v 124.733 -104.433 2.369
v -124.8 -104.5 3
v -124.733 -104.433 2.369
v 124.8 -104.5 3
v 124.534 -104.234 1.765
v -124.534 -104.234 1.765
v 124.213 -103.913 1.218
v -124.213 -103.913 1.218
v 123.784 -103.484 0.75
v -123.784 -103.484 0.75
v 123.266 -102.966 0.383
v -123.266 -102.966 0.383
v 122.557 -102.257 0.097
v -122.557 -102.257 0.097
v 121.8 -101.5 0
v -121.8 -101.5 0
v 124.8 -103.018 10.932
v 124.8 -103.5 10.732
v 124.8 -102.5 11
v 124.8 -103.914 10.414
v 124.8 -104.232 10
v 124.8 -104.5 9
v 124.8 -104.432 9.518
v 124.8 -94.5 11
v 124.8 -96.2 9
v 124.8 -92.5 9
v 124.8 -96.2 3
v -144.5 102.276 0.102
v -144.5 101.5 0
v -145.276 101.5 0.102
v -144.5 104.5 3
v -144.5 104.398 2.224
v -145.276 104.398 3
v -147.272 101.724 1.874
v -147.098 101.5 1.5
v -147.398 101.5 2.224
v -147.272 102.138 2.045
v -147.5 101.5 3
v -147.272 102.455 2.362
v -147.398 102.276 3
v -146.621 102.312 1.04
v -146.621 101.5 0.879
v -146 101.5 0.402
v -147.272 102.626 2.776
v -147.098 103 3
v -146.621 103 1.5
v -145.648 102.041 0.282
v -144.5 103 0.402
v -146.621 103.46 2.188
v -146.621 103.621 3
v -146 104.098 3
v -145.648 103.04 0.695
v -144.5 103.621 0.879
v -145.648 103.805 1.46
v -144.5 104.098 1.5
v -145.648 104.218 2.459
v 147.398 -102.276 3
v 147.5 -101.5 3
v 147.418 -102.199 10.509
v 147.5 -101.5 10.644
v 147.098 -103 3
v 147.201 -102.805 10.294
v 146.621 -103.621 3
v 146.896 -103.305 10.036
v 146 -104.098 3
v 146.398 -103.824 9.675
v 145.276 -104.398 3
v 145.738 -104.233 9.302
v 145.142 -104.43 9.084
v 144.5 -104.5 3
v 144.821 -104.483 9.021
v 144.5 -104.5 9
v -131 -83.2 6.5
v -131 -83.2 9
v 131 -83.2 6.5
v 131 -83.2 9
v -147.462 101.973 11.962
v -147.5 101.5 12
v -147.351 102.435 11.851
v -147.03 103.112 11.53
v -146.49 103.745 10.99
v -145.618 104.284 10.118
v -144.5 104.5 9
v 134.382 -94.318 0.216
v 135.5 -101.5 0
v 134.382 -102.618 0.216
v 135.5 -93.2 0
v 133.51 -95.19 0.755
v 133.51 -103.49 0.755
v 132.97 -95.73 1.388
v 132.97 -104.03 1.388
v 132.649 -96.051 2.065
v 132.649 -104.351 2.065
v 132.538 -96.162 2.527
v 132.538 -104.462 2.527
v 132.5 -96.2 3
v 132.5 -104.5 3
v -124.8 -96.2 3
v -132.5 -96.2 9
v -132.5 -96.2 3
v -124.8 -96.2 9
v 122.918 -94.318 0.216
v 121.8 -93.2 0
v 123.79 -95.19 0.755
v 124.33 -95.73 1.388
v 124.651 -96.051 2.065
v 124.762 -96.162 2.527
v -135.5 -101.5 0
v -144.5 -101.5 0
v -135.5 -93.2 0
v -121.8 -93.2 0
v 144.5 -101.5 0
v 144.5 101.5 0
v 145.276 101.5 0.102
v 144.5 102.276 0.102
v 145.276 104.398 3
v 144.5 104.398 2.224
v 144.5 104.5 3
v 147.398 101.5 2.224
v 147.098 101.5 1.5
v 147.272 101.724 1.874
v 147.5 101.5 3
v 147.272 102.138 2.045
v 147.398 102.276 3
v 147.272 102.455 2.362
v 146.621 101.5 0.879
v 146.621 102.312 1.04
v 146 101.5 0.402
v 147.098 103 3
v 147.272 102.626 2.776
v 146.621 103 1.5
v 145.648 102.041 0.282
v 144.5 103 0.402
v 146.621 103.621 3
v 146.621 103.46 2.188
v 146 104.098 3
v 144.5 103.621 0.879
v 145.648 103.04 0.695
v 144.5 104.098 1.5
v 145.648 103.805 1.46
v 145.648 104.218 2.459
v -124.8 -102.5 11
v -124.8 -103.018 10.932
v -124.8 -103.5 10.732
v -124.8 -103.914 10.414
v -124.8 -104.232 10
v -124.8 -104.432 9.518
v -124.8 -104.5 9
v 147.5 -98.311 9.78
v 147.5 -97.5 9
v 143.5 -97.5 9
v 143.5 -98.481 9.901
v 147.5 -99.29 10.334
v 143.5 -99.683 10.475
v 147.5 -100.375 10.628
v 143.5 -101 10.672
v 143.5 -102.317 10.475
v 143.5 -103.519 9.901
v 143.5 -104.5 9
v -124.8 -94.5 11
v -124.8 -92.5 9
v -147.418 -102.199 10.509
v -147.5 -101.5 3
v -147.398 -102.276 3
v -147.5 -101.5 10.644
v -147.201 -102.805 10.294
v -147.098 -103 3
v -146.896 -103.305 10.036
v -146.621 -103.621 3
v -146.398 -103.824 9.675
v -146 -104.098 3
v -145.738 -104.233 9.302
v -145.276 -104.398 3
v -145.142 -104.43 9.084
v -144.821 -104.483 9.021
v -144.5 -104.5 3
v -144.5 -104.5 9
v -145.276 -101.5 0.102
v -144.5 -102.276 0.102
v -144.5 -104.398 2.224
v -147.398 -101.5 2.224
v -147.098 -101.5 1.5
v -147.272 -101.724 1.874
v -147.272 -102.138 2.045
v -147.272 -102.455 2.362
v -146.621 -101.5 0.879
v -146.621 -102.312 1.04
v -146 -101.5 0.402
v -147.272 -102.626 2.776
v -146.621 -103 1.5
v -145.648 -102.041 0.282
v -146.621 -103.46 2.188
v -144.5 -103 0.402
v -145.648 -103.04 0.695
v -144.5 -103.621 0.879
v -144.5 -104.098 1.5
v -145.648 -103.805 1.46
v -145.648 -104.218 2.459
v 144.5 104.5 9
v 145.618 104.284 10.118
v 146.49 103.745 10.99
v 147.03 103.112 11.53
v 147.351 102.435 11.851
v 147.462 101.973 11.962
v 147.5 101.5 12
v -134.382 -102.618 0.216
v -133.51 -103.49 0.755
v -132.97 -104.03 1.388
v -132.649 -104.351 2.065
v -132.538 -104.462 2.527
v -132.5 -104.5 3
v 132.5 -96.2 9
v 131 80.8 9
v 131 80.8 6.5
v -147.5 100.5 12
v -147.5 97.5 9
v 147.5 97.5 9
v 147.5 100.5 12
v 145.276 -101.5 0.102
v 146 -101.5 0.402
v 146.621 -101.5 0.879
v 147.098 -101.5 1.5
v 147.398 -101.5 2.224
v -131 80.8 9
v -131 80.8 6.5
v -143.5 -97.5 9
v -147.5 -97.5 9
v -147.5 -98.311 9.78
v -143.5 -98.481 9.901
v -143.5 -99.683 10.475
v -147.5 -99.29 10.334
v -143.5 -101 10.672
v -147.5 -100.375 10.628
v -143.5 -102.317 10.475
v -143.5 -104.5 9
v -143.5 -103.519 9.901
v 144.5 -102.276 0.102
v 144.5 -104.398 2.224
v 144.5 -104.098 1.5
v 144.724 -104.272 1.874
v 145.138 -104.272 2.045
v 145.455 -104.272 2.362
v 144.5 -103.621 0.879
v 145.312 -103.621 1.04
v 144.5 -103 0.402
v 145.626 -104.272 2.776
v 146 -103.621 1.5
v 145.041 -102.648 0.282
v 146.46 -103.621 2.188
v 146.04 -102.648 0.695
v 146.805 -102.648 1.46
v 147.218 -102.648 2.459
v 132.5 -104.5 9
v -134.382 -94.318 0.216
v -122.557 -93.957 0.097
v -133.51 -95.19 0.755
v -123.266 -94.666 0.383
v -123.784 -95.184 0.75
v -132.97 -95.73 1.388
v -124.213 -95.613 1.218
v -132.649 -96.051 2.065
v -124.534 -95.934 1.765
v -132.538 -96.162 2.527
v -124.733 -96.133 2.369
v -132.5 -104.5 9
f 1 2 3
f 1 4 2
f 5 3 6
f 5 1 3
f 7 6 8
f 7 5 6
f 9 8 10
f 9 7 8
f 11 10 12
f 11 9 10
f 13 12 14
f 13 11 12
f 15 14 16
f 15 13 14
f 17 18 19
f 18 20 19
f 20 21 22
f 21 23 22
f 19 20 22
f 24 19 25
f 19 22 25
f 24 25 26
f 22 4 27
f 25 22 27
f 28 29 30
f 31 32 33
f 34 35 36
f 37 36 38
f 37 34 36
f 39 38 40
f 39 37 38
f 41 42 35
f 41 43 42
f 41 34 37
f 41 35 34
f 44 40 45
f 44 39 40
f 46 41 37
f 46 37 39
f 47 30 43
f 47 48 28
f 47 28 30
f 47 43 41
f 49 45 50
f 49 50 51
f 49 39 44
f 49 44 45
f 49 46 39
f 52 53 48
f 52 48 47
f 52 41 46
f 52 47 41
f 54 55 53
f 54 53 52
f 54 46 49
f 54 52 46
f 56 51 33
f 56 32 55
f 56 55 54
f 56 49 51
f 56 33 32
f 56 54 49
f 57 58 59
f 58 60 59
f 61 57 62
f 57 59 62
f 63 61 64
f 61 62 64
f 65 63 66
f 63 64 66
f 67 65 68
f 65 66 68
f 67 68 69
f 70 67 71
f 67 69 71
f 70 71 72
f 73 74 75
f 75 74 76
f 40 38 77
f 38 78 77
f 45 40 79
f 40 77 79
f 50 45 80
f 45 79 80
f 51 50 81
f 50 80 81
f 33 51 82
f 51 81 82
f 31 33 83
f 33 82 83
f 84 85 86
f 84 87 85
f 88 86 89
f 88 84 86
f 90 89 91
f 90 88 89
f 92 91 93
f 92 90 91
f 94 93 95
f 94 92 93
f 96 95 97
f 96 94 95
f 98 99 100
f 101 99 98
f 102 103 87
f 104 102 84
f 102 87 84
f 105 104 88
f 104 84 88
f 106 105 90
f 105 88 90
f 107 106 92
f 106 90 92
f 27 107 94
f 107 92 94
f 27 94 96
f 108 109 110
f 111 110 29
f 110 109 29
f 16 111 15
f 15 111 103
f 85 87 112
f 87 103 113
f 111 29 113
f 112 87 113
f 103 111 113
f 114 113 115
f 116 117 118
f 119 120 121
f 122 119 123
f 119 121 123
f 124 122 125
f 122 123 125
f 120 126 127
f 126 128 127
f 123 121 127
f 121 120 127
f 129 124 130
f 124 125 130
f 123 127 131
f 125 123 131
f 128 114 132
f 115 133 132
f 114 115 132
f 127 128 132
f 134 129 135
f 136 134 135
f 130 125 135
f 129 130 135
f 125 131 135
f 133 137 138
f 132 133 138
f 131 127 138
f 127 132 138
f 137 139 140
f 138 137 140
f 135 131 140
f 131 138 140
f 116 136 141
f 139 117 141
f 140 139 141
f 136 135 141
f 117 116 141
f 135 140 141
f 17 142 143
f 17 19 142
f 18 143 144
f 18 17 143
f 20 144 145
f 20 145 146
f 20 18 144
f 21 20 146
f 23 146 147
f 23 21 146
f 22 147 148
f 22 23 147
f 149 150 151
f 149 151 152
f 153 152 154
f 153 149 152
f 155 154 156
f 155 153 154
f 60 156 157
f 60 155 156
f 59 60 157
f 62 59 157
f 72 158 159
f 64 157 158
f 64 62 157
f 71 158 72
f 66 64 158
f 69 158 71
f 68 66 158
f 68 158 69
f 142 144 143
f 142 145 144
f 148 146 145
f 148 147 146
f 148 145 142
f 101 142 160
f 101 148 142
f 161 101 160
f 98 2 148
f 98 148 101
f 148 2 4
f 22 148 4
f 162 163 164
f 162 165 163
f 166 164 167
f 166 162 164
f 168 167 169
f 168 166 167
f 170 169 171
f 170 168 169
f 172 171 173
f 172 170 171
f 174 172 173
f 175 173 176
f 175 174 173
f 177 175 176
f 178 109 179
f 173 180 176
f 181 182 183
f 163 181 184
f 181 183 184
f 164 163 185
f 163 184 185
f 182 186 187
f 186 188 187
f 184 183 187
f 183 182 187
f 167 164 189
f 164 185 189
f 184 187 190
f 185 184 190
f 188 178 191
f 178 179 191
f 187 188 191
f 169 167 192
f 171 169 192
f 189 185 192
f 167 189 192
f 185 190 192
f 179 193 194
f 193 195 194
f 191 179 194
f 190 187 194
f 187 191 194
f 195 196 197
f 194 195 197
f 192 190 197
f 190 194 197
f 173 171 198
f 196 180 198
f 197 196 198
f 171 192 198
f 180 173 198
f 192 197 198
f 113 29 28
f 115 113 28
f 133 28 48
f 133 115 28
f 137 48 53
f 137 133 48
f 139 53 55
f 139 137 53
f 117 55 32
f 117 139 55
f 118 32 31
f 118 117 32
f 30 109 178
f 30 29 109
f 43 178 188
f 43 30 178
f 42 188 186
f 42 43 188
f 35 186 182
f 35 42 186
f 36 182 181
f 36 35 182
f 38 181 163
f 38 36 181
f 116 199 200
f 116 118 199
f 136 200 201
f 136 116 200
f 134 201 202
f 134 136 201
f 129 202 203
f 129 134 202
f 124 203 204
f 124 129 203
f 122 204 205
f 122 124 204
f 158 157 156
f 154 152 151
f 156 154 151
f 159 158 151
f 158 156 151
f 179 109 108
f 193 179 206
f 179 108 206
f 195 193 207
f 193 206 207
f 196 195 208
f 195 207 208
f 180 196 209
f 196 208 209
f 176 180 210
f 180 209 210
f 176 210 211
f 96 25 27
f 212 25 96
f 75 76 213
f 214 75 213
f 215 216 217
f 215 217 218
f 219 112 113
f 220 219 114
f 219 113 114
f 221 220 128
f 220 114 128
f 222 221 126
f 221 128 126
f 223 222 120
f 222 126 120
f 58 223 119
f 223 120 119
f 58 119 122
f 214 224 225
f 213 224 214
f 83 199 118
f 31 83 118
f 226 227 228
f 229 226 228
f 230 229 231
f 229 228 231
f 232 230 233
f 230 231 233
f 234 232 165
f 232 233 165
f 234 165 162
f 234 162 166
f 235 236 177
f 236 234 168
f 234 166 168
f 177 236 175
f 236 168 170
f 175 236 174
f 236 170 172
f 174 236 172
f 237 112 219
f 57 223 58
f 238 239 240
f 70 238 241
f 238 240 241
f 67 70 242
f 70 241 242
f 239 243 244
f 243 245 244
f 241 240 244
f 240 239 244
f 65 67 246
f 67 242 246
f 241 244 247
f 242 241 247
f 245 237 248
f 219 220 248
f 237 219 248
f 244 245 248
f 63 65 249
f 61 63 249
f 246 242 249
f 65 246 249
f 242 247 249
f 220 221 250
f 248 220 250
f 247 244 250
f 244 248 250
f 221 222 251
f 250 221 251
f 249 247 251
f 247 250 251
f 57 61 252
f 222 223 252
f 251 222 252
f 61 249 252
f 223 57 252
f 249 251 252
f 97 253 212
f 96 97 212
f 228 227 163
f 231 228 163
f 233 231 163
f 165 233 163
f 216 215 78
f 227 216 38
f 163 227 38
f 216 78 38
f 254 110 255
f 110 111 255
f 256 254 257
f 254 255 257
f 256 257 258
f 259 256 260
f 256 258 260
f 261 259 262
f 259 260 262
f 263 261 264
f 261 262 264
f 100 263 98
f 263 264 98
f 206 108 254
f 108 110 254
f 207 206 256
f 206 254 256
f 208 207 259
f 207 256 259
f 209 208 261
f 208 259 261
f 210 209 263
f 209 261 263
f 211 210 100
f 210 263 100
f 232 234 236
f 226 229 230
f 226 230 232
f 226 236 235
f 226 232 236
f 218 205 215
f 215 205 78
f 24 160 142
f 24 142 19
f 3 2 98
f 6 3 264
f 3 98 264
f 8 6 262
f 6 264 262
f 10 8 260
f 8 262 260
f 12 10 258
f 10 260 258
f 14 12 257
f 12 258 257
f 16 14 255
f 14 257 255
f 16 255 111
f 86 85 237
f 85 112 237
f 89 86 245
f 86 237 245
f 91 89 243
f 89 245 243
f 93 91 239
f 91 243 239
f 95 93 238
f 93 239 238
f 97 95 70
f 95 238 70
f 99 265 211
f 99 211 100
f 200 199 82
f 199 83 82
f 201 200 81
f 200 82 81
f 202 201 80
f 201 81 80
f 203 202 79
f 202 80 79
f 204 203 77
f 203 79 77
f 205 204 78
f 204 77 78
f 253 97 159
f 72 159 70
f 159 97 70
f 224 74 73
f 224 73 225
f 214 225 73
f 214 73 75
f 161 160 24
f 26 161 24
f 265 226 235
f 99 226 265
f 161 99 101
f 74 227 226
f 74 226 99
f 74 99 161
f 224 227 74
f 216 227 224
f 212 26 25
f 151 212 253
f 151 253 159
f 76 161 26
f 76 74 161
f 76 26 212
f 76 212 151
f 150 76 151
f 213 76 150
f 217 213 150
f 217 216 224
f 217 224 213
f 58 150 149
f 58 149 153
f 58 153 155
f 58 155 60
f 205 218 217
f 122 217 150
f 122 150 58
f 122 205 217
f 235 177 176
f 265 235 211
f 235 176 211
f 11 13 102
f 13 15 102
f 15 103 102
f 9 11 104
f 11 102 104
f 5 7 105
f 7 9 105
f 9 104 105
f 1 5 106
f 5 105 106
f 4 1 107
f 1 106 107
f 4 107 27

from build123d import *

# Parameters (mm, degrees)
SKETCH1_W           = 295
SKETCH1_H           = 209
BOSS_EXTRUDE1_DEPTH = 9
SKETCH2_W           = 262
SKETCH2_H           = 164
CUT_EXTRUDE1_DEPTH  = 2.5
SKETCH3_W           = 3
SKETCH3_H           = 3
BOSS_EXTRUDE2_DEPTH = 295
CHAMFER1_SIZE       = 4
SKETCH4_W           = 7.7
SKETCH4_H           = 8.3
CUT_EXTRUDE2_DEPTH  = 250
BOSS_EXTRUDE3_DEPTH = 4
SKETCH6_W           = 249.6
SKETCH6_H           = 10
BOSS_EXTRUDE4_DEPTH = 2
CHAMFER2_SIZE       = 2
FILLET1_R           = 2
FILLET2_R           = 3


# Some blends are built 0.0001 mm under size
with BuildPart() as part:
    # Sketch1 → Boss-Extrude1 (new body)
    with BuildSketch(Plane.XY):
        Rectangle(SKETCH1_W, SKETCH1_H)
    extrude(amount=BOSS_EXTRUDE1_DEPTH)

    # Sketch2 → Cut-Extrude1 (cut)
    with BuildSketch(Plane.XY.offset(9)):
        with Locations((0, -1.2)):
            Rectangle(SKETCH2_W, SKETCH2_H)
    extrude(amount=-CUT_EXTRUDE1_DEPTH, mode=Mode.SUBTRACT)

    # Sketch3 → Boss-Extrude2 (add)
    with BuildSketch(Plane(origin=(147.5, 0, 0), x_dir=(0, 0, -1), z_dir=(1, 0, 0))):
        with Locations((-10.5, 103)):
            Rectangle(SKETCH3_W, SKETCH3_H)
    extrude(amount=-BOSS_EXTRUDE2_DEPTH)

    # Chamfer1
    # the kernel refuses this chamfer: 4 mm, written as the material it adds along each edge
    with BuildSketch(Plane(origin=(147.5, 101.5, 9), x_dir=(0, -0.9996219169112968, -0.02749587661058651), z_dir=(-1, 0, 0))) as chamfer1_piece_1_section:
        Polygon((CHAMFER1_SIZE * 0.999621916911, CHAMFER1_SIZE * 0.0274958766106), (-CHAMFER1_SIZE * 0.0274958766106, CHAMFER1_SIZE * 0.999621916911), (0, 0), align=None)
    chamfer1_piece_1 = extrude(amount=295, mode=Mode.PRIVATE)
    chamfer1_piece_1 = split(chamfer1_piece_1, bisect_by=Plane(origin=(0, 100.092163559, 12), z_dir=(0, 0, -1)), keep=Keep.TOP, mode=Mode.PRIVATE)
    add(chamfer1_piece_1)

    # Sketch4 → Cut-Extrude2 (cut)
    with BuildSketch(Plane.XY.offset(9)):
        with Locations((-128.65, -100.35)):
            Rectangle(SKETCH4_W, SKETCH4_H)
        with Locations((128.65, -100.35)):
            Rectangle(SKETCH4_W, SKETCH4_H)
    extrude(amount=-CUT_EXTRUDE2_DEPTH, mode=Mode.SUBTRACT)

    # Sketch5 → Boss-Extrude3 (add)
    with BuildSketch(Plane(origin=(147.5, 0, 0), x_dir=(0, 0, -1), z_dir=(1, 0, 0))):
        with BuildLine():
            Line((-9, -104.5), (-9, -97.5))
            ThreePointArc((-9, -97.5), (-10.671572875, -101), (-9, -104.5))
        make_face()
    boss_extrude3 = extrude(amount=-BOSS_EXTRUDE3_DEPTH)

    # Mirror1: Boss-Extrude3 across plane
    add(boss_extrude3.mirror(Plane(origin=(0, 0, 0), x_dir=(0, 0, 1), z_dir=(1, 0, 0))))

    # Sketch6 → Boss-Extrude4 (add)
    with BuildSketch(Plane.XY.offset(9)):
        with Locations((0, -99.5)):
            Rectangle(SKETCH6_W, SKETCH6_H)
    extrude(amount=BOSS_EXTRUDE4_DEPTH)

    # Chamfer2
    chamfer2_edges = [part.edges().sort_by_distance(p)[0] for p in [
        (0, -94.5, 9),
    ]]
    chamfer(chamfer2_edges, length=CHAMFER2_SIZE - 0.0001)  # a hair under: the kernel refuses the full size

    # Fillet1
    fillet1_edges = [part.edges().sort_by_distance(p)[0] for p in [
        (0, -104.5, 11),
    ]]
    fillet(fillet1_edges, radius=FILLET1_R)

    # Fillet2
    fillet2_edges = [part.edges().sort_by_distance(p)[0] for p in [
        (0, 104.5, 12),
        (0, 104.5, 0),
        (0, -104.5, 0),
        (147.5, 0, 0),
        (-124.8, -100.35, 0),
        (-128.65, -96.2, 0),
        (-132.5, -100.35, 0),
        (-140, -104.5, 0),
        (-147.5, 0, 0),
        (140, -104.5, 0),
        (132.5, -100.35, 0),
        (128.65, -96.2, 0),
        (124.8, -100.35, 0),
        (-147.5, 104.5, 6),
        (147.5, 104.5, 6),
        (147.5, -104.5, 4.5),
        (-147.5, -104.5, 4.5),
    ]]
    fillet(fillet2_edges, radius=FILLET2_R)


solid = part.part
